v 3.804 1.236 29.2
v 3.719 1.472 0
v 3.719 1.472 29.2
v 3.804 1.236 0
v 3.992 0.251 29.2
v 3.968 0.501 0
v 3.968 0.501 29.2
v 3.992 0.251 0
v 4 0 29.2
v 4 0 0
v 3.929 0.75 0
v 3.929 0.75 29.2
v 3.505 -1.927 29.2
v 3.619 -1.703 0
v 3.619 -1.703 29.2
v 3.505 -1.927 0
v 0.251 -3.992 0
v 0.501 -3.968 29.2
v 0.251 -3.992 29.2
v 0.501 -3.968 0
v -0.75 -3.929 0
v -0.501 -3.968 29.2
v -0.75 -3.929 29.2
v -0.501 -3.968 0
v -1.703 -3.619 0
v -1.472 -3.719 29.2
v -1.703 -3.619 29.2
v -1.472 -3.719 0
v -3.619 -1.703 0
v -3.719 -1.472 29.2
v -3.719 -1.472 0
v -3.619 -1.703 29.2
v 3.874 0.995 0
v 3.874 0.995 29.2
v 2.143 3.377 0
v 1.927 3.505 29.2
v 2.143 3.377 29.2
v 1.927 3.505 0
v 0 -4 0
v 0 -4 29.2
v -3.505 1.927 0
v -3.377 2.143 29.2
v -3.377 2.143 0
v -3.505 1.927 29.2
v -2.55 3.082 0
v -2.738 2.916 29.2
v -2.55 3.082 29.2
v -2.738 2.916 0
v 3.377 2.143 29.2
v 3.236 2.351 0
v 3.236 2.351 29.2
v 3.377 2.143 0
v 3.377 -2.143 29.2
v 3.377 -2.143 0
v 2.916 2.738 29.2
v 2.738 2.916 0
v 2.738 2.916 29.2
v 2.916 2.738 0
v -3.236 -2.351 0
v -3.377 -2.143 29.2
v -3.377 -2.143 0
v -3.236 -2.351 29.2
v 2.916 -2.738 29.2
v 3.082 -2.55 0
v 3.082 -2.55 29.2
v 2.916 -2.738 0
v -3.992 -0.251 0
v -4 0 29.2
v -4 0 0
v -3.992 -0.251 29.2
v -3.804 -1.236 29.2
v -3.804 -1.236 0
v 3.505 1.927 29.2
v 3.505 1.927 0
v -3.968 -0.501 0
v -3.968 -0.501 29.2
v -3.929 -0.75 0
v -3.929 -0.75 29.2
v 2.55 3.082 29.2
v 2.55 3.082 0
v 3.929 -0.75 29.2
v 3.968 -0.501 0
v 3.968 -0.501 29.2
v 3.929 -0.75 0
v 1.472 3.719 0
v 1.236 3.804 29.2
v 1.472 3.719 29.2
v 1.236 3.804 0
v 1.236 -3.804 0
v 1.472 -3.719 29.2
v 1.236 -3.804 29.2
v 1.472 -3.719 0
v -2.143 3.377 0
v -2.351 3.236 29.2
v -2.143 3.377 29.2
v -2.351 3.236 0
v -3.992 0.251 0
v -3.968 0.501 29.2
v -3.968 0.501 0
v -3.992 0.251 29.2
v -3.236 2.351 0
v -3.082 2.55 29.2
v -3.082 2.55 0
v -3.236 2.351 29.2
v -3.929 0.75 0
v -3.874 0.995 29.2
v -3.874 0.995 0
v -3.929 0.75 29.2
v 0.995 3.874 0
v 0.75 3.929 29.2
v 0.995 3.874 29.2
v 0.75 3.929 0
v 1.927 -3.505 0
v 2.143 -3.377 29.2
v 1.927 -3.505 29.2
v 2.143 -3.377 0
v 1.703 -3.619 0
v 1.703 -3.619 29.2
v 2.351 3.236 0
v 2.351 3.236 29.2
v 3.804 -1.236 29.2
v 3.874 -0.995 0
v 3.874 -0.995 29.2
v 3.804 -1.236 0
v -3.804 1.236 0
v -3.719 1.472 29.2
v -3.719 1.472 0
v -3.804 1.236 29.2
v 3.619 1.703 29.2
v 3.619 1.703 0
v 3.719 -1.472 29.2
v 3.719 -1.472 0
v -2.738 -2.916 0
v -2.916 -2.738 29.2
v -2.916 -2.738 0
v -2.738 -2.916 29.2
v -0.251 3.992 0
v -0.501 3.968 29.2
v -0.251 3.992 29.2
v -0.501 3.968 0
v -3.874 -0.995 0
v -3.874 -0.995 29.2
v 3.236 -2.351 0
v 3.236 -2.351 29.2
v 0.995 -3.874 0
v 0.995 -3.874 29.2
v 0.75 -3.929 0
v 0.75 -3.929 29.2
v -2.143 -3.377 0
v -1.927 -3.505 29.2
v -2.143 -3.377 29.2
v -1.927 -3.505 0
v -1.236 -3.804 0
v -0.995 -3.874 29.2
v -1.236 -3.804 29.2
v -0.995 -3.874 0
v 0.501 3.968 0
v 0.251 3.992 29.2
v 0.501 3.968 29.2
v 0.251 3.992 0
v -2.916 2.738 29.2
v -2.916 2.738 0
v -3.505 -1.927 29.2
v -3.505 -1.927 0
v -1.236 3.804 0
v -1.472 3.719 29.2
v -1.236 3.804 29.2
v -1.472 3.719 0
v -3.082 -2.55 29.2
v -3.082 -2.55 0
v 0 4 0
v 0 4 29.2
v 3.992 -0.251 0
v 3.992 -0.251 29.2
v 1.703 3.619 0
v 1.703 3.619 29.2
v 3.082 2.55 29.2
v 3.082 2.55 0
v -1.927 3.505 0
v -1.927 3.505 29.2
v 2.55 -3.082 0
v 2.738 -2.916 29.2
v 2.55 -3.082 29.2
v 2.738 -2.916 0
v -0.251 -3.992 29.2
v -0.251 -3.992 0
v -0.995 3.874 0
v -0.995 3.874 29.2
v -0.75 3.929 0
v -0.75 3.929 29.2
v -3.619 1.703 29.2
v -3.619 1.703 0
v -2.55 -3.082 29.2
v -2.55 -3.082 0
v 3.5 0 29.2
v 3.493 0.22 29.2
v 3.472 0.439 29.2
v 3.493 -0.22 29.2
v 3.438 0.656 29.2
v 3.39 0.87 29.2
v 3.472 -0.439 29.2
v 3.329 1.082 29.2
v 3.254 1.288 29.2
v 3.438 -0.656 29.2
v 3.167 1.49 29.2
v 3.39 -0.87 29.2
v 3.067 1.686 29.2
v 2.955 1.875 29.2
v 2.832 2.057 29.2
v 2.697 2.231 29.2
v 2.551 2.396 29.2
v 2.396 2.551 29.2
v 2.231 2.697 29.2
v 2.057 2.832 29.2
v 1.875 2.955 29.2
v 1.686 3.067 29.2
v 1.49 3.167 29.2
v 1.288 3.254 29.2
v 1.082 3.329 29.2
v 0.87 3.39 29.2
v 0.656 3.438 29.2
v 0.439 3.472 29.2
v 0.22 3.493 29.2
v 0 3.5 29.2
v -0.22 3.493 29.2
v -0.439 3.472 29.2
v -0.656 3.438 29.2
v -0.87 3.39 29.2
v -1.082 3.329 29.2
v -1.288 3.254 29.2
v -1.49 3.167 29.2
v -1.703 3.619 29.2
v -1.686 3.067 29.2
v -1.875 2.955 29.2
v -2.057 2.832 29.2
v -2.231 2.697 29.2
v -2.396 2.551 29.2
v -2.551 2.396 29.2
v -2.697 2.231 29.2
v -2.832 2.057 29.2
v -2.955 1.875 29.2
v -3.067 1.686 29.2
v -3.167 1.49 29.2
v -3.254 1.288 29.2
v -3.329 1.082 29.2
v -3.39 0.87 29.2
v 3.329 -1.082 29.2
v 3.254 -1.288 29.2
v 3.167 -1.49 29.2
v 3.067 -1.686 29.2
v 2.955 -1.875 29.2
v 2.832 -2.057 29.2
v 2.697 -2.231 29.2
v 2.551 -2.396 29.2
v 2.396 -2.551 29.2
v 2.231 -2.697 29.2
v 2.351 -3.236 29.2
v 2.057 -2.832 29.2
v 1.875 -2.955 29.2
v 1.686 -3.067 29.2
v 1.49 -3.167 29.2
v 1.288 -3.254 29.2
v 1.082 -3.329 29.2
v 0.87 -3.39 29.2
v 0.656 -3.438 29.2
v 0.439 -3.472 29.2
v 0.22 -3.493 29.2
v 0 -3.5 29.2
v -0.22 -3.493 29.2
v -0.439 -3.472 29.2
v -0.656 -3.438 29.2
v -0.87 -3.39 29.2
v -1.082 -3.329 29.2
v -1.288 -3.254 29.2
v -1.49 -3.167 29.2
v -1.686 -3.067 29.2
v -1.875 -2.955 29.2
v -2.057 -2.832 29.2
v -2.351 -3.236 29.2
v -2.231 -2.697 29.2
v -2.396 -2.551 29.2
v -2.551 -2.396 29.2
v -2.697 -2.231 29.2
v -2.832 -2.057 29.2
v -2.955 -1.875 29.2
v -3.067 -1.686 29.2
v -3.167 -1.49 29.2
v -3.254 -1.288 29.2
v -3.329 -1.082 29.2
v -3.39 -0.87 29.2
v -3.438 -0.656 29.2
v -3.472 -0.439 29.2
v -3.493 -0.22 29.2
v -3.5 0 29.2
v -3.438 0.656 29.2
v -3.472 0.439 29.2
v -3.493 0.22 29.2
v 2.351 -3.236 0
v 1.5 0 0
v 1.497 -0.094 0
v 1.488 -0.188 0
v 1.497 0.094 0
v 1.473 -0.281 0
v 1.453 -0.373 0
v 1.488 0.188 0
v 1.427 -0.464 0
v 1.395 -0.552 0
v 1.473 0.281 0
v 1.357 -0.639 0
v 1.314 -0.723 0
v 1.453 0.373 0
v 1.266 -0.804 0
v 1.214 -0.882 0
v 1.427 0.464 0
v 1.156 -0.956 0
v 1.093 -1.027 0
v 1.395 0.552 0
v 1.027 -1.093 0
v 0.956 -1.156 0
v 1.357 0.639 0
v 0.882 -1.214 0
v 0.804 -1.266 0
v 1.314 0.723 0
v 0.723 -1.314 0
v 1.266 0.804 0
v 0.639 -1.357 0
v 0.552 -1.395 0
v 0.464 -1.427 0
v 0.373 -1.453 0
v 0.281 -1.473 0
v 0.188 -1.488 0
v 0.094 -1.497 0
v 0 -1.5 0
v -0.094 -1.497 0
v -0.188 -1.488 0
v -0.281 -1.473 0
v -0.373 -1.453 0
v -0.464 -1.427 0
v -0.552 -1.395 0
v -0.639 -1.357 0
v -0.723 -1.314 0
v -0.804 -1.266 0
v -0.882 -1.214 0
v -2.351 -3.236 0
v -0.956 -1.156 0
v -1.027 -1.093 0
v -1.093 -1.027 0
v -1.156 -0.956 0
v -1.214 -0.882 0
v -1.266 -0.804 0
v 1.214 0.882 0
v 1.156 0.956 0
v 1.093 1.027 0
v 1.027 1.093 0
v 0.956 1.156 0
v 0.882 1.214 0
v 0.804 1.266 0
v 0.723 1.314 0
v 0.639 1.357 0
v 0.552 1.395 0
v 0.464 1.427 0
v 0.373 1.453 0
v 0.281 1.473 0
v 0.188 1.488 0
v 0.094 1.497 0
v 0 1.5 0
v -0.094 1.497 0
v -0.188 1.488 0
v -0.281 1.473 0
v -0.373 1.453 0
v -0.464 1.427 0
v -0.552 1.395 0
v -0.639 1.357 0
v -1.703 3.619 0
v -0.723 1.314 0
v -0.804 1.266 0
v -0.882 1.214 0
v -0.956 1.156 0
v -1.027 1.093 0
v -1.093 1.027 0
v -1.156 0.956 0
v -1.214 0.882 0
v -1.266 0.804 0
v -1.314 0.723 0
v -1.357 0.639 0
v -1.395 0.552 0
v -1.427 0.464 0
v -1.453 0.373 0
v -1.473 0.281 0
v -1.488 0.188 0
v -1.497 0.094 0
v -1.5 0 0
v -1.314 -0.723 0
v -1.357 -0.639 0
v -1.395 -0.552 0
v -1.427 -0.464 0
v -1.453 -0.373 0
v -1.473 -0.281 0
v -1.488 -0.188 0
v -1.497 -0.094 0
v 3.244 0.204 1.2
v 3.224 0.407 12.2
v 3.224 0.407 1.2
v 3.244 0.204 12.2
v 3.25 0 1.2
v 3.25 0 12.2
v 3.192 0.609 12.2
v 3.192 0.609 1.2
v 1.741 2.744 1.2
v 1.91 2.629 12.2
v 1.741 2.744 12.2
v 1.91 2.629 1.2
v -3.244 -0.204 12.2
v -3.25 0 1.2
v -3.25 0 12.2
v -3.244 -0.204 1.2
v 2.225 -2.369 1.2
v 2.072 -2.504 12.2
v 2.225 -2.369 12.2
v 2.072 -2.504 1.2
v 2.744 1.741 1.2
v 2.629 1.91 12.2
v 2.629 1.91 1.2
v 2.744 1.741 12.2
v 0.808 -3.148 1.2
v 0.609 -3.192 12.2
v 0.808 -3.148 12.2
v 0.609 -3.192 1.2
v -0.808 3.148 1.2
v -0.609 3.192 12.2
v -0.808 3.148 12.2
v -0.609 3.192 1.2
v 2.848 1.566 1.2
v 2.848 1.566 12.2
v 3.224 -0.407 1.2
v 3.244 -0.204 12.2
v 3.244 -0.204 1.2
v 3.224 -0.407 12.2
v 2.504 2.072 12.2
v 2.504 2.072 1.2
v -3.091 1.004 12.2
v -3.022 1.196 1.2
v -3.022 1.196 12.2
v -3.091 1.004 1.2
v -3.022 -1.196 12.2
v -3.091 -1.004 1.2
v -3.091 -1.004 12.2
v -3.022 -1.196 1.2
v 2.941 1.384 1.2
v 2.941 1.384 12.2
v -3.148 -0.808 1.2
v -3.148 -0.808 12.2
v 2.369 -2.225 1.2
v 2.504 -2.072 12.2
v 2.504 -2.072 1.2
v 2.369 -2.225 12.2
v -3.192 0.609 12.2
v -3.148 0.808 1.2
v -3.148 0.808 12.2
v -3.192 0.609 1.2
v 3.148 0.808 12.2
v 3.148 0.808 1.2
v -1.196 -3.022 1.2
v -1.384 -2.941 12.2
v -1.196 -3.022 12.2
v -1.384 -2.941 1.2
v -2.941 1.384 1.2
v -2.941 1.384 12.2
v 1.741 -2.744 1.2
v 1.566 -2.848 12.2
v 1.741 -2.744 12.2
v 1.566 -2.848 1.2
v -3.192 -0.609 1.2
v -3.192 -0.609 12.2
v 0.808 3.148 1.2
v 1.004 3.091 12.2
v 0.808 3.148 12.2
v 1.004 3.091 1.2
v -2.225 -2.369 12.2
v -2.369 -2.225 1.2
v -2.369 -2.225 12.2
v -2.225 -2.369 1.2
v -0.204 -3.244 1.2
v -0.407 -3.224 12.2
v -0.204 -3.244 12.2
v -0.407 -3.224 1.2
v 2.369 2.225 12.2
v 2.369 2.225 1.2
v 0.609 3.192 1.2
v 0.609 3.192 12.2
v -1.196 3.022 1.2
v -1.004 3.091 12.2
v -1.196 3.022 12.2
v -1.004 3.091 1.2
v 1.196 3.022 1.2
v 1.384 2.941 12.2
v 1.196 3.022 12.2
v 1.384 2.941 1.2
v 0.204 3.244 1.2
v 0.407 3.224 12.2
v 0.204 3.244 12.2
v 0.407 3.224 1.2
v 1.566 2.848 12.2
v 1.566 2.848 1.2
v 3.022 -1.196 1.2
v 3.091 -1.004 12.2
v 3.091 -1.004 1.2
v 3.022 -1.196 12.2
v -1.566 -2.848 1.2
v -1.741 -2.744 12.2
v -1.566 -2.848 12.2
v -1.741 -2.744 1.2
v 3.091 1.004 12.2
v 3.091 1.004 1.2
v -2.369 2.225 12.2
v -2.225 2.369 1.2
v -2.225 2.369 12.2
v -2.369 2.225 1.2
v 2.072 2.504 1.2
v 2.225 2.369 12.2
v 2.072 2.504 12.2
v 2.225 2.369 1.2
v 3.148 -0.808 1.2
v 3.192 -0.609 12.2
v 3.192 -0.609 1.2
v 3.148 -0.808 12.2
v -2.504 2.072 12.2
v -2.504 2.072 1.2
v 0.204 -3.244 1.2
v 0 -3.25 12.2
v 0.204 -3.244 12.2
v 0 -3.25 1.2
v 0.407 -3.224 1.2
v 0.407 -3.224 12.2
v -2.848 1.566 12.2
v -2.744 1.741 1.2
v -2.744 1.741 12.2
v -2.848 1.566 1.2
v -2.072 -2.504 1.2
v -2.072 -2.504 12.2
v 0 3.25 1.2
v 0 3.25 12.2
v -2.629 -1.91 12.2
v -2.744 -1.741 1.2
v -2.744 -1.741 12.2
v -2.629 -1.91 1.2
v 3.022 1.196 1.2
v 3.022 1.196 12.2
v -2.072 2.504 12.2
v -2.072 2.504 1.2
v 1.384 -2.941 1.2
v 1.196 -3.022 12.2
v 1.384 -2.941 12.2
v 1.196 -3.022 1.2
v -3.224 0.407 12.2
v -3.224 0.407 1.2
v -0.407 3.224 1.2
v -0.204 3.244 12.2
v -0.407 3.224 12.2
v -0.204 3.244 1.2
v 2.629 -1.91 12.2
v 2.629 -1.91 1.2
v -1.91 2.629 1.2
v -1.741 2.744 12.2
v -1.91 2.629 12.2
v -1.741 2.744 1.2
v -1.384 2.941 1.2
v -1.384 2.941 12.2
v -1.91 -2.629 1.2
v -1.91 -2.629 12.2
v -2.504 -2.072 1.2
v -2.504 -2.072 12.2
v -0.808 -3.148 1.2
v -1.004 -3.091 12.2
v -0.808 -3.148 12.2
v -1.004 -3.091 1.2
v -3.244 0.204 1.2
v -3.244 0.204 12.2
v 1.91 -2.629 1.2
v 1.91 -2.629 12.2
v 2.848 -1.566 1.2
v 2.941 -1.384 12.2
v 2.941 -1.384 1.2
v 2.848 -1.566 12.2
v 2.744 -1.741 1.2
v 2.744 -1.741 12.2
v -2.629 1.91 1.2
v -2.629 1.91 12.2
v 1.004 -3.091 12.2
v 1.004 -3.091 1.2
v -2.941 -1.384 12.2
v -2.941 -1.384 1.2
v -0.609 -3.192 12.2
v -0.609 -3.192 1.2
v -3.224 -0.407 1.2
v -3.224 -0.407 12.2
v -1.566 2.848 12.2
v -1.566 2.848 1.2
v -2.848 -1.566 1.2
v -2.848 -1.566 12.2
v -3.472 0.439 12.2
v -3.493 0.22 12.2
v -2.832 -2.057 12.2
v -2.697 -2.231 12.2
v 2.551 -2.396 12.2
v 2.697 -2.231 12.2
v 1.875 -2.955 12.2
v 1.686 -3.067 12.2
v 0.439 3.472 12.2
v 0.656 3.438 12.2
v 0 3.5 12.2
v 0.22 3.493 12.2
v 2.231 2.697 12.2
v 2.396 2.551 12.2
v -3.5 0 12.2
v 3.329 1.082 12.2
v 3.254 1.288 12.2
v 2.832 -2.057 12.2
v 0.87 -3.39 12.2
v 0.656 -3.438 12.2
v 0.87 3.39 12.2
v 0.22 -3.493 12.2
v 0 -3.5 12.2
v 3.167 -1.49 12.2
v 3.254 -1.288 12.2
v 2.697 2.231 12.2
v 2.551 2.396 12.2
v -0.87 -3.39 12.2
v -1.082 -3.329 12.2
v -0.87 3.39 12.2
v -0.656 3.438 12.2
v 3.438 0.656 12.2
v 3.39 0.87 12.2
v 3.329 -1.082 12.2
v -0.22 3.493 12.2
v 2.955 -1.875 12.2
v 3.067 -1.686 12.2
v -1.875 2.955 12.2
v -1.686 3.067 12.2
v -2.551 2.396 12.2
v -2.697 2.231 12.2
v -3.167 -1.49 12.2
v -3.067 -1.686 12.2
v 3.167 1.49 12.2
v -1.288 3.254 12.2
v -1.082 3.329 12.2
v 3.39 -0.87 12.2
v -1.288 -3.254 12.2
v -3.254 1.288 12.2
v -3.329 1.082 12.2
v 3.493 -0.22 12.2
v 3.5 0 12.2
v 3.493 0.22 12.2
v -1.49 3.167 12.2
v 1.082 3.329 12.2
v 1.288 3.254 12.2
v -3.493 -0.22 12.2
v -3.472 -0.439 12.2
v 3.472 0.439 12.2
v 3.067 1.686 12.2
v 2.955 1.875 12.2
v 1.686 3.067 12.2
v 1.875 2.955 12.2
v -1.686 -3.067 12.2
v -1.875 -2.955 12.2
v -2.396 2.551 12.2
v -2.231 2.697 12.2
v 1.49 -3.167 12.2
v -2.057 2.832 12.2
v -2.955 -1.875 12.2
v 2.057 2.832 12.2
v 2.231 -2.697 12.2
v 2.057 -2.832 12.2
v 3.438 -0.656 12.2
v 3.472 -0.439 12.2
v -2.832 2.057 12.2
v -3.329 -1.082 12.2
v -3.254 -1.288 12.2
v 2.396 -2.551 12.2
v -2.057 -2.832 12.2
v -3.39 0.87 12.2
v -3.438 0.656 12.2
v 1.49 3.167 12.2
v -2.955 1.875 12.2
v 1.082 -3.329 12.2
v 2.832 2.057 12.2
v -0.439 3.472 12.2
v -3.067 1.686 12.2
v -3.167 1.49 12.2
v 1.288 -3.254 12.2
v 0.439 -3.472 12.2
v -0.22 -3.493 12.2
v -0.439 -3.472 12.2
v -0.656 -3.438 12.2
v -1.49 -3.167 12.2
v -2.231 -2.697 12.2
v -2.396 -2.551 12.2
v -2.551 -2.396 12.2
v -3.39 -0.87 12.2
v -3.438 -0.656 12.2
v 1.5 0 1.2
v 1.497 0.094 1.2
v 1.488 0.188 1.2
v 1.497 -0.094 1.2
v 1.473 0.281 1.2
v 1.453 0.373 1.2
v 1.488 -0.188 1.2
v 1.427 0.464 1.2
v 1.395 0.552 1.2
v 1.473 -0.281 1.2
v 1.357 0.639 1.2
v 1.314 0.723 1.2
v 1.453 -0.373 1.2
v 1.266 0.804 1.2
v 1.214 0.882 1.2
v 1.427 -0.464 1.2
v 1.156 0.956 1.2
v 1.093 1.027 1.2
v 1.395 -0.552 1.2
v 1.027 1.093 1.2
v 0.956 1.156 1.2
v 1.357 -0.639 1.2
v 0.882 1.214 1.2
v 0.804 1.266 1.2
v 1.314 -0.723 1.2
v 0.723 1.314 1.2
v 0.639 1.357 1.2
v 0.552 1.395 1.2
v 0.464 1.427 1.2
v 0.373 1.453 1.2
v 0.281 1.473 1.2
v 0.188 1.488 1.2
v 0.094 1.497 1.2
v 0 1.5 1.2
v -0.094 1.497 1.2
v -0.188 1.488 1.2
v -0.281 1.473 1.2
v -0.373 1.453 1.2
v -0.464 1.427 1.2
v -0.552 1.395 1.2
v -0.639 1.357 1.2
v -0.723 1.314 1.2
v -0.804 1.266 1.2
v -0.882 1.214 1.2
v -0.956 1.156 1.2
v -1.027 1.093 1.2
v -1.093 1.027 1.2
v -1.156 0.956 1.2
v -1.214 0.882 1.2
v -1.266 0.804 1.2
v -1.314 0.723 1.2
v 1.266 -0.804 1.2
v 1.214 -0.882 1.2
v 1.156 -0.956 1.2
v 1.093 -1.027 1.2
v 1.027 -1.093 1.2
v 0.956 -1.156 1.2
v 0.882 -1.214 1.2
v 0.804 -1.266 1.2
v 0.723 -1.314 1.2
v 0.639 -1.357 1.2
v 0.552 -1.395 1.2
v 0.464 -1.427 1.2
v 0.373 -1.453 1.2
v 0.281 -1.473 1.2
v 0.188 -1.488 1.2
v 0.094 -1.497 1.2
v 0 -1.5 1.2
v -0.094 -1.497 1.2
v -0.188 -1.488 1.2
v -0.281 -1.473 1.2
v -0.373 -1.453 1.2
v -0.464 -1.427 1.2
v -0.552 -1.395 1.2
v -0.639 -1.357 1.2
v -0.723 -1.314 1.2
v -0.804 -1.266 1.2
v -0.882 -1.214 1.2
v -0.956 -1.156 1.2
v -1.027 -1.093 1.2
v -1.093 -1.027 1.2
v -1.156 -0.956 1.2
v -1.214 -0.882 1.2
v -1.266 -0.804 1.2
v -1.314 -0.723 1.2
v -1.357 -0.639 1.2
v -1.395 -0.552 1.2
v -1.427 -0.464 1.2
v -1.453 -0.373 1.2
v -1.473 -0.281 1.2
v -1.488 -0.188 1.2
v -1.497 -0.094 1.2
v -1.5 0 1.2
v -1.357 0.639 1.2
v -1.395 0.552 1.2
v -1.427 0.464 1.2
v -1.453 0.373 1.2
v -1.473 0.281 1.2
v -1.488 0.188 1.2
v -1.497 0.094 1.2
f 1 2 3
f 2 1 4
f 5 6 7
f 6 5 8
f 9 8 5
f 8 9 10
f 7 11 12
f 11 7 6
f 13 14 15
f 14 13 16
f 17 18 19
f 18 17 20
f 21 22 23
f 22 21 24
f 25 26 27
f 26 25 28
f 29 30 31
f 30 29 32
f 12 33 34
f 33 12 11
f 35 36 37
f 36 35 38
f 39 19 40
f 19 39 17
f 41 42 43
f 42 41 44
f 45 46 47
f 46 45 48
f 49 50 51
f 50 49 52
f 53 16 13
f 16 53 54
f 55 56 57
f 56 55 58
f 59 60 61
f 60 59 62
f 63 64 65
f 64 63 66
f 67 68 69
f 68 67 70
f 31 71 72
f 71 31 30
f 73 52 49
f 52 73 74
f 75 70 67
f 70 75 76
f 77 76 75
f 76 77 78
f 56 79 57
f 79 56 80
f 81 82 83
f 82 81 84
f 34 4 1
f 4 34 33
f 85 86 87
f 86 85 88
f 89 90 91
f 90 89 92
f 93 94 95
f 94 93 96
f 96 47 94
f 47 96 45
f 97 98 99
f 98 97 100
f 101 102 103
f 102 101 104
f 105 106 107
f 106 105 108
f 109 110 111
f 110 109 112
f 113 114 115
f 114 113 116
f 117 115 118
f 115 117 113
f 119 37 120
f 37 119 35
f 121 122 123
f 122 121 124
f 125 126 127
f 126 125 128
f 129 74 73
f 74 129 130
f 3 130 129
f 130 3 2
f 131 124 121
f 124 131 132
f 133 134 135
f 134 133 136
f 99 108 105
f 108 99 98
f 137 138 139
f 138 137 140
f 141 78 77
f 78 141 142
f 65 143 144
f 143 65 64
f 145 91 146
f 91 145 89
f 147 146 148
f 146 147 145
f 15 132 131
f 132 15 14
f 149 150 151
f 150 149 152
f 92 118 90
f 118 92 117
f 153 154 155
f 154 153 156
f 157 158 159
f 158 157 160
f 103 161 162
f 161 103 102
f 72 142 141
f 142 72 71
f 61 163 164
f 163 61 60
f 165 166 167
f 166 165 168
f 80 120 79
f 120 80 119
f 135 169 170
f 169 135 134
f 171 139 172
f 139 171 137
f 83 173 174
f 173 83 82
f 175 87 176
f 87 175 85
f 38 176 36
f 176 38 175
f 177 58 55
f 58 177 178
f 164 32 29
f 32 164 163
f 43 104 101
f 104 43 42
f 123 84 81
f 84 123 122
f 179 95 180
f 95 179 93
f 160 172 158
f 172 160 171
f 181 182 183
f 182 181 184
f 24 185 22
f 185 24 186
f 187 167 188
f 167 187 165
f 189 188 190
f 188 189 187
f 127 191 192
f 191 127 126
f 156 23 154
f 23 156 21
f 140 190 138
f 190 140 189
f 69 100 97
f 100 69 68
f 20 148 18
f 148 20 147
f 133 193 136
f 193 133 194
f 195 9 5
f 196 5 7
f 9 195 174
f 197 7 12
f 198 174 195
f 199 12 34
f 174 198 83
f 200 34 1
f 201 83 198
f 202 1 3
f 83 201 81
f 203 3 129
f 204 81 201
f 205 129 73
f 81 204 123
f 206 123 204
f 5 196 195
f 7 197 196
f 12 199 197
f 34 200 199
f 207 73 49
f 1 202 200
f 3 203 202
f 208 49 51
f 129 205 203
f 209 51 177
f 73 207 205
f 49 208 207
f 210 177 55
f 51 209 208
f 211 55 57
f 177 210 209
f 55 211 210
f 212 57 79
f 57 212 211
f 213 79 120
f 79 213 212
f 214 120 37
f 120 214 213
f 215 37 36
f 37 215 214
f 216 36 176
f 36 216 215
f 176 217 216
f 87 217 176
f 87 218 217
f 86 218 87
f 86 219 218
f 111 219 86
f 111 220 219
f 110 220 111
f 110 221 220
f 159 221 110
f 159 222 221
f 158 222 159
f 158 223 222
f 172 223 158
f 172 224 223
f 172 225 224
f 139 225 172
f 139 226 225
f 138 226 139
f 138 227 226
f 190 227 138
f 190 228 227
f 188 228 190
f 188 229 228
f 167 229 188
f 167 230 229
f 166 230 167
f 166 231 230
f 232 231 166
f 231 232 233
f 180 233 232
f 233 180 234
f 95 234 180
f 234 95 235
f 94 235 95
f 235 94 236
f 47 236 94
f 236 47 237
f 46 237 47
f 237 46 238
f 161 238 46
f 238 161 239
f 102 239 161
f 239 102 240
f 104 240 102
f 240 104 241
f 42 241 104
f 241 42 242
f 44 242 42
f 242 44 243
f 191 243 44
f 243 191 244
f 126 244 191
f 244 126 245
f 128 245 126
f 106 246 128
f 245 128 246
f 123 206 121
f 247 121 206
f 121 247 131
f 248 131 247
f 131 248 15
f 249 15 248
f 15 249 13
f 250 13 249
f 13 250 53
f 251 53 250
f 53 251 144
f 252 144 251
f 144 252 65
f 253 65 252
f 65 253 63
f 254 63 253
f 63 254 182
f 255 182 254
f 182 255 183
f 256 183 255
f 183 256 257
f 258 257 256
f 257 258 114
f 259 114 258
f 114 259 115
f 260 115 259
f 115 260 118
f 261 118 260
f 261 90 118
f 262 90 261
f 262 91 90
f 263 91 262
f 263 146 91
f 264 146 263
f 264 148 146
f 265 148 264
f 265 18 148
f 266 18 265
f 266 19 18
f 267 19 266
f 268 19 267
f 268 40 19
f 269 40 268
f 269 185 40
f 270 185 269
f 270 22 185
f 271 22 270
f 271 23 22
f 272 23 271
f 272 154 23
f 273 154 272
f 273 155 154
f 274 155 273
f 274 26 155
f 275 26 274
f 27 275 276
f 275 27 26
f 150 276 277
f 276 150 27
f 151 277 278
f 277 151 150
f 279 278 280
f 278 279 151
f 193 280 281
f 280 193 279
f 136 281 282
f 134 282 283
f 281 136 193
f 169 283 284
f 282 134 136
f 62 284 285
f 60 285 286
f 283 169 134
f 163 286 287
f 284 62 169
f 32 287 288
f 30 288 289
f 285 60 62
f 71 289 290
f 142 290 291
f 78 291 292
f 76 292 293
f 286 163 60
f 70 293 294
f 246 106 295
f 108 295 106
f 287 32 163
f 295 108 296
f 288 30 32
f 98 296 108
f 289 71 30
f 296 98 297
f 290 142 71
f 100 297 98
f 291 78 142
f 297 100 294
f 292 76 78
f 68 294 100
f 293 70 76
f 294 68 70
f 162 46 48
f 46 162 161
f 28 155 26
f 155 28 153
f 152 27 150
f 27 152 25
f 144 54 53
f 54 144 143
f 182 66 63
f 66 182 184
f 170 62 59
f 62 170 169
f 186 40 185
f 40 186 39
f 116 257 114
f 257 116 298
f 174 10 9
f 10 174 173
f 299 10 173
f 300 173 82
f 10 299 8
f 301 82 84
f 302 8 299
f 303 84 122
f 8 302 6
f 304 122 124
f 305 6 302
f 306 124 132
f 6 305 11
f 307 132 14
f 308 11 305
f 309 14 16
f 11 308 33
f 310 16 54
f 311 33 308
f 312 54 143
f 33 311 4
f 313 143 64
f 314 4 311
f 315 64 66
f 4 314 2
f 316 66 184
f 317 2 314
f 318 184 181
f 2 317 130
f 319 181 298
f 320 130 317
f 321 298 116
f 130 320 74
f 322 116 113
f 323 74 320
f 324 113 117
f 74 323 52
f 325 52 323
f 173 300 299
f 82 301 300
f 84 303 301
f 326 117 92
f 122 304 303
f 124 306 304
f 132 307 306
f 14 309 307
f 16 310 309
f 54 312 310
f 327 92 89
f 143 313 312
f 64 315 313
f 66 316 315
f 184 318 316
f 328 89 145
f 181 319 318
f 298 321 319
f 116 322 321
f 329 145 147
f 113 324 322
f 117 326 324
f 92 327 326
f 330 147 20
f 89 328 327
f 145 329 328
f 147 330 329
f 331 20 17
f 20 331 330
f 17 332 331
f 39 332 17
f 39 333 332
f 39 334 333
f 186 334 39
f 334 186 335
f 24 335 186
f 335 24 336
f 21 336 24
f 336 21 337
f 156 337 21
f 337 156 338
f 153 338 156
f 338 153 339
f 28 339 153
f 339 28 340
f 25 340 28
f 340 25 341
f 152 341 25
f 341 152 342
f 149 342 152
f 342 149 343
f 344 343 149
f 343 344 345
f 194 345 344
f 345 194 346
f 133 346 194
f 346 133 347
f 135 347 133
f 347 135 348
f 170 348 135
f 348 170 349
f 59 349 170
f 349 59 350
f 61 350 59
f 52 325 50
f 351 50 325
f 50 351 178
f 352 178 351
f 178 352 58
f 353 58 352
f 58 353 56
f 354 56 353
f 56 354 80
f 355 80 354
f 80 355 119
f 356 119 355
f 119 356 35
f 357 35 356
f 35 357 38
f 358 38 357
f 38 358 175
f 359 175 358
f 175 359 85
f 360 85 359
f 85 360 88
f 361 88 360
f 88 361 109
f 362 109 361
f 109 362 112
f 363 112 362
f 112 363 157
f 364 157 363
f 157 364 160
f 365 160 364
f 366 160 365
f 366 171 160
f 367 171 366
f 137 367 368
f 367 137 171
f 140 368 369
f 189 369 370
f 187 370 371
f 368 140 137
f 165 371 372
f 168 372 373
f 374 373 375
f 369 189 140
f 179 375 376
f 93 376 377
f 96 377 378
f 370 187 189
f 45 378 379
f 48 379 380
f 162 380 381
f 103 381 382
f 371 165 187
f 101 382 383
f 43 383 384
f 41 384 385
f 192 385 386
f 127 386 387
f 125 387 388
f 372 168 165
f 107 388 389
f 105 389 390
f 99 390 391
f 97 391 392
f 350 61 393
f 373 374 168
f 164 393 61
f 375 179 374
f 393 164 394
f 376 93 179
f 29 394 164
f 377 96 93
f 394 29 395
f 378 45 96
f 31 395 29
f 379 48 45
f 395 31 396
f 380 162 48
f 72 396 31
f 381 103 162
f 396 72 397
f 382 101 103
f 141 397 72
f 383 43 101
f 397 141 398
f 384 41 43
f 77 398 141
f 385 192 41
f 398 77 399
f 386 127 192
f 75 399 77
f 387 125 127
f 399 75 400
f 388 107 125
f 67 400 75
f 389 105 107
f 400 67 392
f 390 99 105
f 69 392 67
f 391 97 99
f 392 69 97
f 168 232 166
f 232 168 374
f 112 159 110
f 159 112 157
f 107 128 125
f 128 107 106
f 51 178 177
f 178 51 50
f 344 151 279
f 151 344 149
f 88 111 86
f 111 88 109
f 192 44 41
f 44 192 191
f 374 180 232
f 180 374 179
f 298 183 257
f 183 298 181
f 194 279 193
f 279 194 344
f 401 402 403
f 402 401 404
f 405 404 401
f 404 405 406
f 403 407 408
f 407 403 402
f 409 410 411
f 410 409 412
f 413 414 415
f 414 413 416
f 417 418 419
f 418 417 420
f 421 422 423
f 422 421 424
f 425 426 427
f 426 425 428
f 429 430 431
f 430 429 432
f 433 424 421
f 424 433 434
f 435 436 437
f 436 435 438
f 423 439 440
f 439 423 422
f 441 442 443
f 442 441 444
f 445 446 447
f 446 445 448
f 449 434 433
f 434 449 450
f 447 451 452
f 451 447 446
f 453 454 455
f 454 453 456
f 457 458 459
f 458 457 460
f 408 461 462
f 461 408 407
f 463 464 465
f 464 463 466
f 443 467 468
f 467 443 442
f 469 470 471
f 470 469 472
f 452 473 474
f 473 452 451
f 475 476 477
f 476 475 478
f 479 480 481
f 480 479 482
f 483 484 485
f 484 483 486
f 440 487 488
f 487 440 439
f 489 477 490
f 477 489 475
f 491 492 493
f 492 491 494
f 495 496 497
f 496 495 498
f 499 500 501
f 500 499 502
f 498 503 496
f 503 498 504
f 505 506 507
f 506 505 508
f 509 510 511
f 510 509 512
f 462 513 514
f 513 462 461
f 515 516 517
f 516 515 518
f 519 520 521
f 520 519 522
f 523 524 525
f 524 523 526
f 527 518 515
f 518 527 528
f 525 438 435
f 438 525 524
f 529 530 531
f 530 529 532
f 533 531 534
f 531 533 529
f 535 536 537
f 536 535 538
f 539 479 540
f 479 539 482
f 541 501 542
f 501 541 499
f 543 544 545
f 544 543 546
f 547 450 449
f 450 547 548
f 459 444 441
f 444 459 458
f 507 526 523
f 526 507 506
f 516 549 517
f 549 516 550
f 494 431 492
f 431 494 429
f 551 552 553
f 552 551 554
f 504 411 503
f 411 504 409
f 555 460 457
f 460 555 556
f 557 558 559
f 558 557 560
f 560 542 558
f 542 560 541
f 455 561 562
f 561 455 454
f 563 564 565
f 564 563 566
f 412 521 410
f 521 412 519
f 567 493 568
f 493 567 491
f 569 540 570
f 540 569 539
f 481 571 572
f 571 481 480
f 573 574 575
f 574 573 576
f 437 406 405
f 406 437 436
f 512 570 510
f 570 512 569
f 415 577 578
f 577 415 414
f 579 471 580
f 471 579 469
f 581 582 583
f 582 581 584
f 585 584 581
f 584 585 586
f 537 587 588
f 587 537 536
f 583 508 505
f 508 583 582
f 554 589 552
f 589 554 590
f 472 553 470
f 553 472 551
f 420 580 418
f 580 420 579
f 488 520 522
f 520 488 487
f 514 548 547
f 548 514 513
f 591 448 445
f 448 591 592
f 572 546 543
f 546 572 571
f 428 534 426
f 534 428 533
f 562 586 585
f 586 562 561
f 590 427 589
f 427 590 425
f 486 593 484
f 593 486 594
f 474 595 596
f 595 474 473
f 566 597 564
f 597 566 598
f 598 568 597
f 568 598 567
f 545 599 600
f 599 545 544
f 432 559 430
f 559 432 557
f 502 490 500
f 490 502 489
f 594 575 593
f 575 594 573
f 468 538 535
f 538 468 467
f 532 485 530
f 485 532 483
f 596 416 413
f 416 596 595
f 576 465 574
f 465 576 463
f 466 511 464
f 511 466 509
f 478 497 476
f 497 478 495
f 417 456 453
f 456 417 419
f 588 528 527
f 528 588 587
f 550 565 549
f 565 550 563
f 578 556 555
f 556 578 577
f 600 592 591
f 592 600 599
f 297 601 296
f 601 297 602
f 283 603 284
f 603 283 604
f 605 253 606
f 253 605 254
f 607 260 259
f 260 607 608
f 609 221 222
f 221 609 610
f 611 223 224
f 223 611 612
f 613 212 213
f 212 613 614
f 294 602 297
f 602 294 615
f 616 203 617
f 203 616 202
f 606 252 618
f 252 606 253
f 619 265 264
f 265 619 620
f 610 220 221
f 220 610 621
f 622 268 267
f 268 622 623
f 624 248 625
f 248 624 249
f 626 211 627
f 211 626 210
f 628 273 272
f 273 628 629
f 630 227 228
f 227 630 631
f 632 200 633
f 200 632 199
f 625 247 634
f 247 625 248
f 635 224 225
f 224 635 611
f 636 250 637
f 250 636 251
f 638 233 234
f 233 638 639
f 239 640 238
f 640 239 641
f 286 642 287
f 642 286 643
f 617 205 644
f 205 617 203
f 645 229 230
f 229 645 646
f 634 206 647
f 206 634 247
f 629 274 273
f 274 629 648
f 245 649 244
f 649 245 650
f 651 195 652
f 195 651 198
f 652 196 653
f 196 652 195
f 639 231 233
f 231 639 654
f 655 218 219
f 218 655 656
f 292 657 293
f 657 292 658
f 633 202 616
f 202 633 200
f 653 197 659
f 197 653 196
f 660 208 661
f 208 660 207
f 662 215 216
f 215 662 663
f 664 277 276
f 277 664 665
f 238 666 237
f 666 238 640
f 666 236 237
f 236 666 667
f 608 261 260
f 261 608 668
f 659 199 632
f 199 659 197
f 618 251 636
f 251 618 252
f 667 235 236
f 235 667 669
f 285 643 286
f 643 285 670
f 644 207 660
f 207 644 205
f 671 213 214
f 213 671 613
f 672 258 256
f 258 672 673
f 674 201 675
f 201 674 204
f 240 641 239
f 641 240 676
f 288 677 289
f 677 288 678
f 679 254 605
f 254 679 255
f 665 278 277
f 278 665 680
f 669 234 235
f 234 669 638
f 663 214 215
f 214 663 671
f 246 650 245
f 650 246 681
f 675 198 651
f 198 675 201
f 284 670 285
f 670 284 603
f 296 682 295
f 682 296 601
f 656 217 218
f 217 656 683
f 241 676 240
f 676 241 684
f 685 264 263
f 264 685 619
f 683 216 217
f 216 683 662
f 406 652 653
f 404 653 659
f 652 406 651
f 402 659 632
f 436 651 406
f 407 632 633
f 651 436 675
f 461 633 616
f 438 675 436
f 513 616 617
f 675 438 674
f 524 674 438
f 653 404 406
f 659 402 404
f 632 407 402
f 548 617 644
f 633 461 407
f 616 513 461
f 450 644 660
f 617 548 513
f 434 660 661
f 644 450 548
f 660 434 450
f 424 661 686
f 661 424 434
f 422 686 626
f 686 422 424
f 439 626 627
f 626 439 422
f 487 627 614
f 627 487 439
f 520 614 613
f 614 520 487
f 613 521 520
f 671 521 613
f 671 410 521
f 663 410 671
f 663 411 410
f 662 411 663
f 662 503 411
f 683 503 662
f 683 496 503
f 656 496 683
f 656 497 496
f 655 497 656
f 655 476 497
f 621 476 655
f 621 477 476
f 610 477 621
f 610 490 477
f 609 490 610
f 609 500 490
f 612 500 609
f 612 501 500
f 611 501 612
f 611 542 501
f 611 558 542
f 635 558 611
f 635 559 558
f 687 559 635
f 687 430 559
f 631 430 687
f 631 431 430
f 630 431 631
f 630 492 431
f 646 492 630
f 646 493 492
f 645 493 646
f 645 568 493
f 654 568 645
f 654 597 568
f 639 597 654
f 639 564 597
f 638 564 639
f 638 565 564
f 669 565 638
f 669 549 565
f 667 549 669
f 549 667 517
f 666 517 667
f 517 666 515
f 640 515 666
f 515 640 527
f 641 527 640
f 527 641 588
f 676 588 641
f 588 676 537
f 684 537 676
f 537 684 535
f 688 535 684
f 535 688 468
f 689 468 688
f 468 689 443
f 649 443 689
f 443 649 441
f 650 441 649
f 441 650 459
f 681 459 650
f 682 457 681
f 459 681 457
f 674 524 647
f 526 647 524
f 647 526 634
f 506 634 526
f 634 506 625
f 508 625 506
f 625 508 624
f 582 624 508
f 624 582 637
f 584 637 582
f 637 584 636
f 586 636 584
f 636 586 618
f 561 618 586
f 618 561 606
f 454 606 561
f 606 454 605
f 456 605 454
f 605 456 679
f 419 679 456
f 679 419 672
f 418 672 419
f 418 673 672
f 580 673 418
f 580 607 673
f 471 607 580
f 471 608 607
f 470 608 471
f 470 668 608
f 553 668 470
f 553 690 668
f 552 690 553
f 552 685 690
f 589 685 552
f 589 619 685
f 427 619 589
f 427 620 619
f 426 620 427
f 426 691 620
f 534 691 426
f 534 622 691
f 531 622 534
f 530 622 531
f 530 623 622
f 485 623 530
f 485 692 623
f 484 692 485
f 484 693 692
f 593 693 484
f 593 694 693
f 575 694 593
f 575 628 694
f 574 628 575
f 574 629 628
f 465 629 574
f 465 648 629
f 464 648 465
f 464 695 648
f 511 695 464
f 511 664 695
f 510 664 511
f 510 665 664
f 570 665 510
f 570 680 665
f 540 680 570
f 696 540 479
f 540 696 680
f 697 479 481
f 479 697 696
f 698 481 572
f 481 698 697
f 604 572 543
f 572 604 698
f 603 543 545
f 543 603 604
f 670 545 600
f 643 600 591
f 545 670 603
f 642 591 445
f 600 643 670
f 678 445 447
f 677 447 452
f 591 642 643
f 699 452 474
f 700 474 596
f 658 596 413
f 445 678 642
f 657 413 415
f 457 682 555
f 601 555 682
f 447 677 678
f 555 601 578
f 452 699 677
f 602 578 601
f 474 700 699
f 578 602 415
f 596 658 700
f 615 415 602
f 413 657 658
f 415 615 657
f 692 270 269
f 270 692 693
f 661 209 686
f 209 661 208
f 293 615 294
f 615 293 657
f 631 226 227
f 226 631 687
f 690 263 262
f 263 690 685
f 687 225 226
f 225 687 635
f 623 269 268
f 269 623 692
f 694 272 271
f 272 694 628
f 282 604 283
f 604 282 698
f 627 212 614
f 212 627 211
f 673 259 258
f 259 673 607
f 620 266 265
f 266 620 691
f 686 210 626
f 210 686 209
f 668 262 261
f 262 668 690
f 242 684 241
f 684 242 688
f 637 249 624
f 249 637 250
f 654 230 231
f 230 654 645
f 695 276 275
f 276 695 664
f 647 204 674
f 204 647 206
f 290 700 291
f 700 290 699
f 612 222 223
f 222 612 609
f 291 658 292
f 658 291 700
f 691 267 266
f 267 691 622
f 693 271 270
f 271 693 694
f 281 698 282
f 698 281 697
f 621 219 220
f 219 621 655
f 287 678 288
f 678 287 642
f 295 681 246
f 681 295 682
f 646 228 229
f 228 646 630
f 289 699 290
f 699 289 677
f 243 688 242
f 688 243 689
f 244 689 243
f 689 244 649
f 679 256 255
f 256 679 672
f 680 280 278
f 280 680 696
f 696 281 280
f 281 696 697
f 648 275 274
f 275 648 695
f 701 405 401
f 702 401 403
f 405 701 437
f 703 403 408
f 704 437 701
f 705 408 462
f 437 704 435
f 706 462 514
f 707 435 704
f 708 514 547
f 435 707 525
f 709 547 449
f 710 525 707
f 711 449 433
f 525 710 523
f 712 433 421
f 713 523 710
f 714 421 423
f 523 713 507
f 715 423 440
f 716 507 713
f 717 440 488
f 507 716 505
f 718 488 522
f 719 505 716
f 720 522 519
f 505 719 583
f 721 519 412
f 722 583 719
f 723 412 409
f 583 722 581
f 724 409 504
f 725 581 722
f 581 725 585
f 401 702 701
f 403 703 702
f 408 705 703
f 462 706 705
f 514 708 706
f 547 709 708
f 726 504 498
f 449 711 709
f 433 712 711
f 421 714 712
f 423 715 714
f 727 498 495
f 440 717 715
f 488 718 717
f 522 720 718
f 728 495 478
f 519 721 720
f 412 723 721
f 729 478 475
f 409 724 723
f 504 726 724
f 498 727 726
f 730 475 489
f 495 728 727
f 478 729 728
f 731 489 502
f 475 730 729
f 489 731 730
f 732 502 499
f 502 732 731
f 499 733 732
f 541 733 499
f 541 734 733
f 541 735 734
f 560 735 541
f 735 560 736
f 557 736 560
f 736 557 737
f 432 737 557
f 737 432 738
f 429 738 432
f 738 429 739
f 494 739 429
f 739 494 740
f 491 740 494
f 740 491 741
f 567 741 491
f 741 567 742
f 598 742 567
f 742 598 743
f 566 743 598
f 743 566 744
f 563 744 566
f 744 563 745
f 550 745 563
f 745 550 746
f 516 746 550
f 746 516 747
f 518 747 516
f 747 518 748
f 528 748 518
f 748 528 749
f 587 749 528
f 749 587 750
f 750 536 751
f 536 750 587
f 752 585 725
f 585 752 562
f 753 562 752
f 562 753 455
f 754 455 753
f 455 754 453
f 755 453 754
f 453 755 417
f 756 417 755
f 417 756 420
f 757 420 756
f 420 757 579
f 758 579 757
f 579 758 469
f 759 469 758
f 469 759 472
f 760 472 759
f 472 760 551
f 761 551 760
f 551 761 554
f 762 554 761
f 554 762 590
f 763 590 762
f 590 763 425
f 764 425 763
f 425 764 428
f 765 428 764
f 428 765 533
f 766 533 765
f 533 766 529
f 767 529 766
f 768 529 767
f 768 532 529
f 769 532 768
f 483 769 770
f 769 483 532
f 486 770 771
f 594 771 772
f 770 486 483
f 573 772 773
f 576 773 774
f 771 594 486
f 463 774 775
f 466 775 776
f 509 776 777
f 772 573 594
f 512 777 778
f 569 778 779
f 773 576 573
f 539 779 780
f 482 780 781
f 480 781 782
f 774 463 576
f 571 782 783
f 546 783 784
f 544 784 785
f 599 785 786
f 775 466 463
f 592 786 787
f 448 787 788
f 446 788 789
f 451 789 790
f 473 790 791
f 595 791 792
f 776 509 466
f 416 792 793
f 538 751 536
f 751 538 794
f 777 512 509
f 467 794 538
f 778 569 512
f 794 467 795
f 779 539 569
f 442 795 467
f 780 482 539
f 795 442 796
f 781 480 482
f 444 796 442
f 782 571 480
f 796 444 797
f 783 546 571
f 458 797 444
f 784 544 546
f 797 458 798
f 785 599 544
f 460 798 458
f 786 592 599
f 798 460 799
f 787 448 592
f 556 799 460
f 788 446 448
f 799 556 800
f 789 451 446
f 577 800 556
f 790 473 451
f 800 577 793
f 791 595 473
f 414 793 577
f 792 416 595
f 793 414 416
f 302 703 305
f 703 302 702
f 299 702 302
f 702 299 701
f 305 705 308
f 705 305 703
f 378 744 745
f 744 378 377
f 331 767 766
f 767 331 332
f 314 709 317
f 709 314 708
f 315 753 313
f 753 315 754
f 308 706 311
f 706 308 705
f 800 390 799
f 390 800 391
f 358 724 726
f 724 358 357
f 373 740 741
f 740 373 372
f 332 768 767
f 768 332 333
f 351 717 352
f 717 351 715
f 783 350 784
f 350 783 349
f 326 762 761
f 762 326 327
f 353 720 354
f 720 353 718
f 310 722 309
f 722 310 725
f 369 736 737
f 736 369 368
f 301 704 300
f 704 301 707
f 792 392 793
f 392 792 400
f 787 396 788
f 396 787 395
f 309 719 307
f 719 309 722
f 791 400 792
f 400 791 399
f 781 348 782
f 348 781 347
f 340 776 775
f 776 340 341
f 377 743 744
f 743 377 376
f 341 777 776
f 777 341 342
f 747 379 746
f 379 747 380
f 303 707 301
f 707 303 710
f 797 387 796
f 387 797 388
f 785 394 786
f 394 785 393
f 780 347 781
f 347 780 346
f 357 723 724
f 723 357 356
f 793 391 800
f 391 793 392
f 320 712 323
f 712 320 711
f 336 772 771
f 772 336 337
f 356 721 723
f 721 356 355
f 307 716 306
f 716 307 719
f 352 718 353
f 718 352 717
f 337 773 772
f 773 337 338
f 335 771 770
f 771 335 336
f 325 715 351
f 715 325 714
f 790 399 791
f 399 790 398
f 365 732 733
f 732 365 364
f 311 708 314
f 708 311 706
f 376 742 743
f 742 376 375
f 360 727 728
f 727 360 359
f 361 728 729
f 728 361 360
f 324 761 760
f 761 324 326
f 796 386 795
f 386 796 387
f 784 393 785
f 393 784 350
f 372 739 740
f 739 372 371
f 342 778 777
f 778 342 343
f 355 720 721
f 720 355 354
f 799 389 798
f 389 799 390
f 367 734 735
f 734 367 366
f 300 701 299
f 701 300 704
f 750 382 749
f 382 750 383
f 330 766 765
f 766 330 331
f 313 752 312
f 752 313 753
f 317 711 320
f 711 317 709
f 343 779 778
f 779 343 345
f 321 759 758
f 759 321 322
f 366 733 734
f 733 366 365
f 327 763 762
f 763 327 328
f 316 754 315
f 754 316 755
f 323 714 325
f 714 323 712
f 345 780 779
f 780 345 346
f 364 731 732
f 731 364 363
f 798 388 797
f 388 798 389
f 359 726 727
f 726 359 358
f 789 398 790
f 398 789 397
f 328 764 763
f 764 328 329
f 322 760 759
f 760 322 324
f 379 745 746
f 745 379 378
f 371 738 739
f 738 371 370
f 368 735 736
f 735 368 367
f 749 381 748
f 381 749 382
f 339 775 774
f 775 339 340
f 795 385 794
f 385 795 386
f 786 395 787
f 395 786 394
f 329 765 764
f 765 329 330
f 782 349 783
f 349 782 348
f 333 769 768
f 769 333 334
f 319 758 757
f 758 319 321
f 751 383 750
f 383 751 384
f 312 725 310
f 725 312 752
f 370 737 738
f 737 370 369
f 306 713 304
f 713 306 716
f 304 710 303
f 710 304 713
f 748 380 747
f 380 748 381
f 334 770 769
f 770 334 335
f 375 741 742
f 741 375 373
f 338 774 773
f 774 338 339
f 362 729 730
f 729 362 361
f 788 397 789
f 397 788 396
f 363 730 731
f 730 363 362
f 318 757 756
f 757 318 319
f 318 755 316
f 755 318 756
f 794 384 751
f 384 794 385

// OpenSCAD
// CSG.scad - Basic example of CSG usage
$fn=100;
INCH=25.4;

Vytah_prumer=INCH*1.25;    // prumer okularoveho vytahu
Posun_pruzoru=0;          // posun pruzoru pro odecitani ze stupnice
Tloustka_sten=3.2;

//Rozmery sroubu a matky pro M3 [mm]
M3_screw_diameter = 3.2;                //prumer sroubu (zavit)
M3_screw_head_height = 3;               //vyska hlavy sroubu
M3_nut_height = 2.7;                    //vyska matky
M3_nut_diameter = 6.6;                  //prumer matky (kruznice opsana)
M3_screw_head_diameter = 6.6;           //prumer hlavy sroubu

// Polomery (osa x,y)
r1=Vytah_prumer/2;      // polomer okularoveho vytahu
r2=r1+3;                // polomer kolimatoru
r3=r1-3.2;    // polomer vzreyu v horni casti kolimatoru
r4=3;                   // polomer pruzoru pro laser
r5=7;                   // polomer dutiny na ulozeni pouzdra diody
r6=10.5+1.5;            // polomer ulozeni baterie
r10=r2-2-2;           //polomer volne plochy (baterie/vicko)
r11=r2-2;             //polomer ulozeni vicka
rud=r5-3;                //polomer ulozeni diody

// Polomery (rovina x,y)
r7=M3_nut_diameter/2;         // polomer matky
r8=M3_screw_diameter/2;       // polomer soubu
r9=M3_screw_head_diameter/2;  // polomer hlavy soubu

// Oblast vicka
v=M3_screw_head_diameter+4;  //vyska pro ulozeni vicka
h11=v;

// Bateriove pouzdro
b=10+v;                       // vyska prostoru mezi baterii a vyckem
p6=b+15;                       // vyska rozsireni pro ulozeni baterie
h10=p6-4;

// Dioda
led=20;                        // vyska led diody
draty=10;                      // vyska prostoru na draty
stena=1.2;                      //tloustka spodni steny ulozeni diody
p5=p6+stena+led+draty;         // vyska rozsileni pro ulozeni diody
rd=3;                            //polomer diody


// Vyska tela
h2=r2+r1+p5;              // vyska kolimatoru bez okularoveho vytahu
h1=h2+25;                   // vyska kolimatoru

// Predefinovane vysky
z1=h2-r2-Posun_pruzoru;     // vyska stredu otvoru pro odecitani ze stupnice

// Vyska (kolimacni srouby)
h7=r5+3.5;                    // poloha dna pro matku
h8=20;                      // delka pruzoru pro sroub
h9=1.8;                       // vyska ulozeni pro hlavu sroubu

// Kostka
a1=(4*(z1))/(sqrt(2));      // delka hrany kostky (pruzor kolimatoru)
a2=40;
a3=40;

//Srouby pro kolimaci   
srouby=3;
dno=6;
h12=v+dno+10;
h13=20;

//Ulozeni diody

difference() {
    cylinder(r=rud,h=stena+led+draty-2);               
    cylinder(r=rd+0.25,h=20);
    translate([0,0,stena+11])
        cylinder(r=rd+0.5,h=20);
    
}
difference() {
    cylinder(r=rud,h=stena);
    cylinder(r=1.5,h=20);
    }
    
echo("r5",r5);
    
